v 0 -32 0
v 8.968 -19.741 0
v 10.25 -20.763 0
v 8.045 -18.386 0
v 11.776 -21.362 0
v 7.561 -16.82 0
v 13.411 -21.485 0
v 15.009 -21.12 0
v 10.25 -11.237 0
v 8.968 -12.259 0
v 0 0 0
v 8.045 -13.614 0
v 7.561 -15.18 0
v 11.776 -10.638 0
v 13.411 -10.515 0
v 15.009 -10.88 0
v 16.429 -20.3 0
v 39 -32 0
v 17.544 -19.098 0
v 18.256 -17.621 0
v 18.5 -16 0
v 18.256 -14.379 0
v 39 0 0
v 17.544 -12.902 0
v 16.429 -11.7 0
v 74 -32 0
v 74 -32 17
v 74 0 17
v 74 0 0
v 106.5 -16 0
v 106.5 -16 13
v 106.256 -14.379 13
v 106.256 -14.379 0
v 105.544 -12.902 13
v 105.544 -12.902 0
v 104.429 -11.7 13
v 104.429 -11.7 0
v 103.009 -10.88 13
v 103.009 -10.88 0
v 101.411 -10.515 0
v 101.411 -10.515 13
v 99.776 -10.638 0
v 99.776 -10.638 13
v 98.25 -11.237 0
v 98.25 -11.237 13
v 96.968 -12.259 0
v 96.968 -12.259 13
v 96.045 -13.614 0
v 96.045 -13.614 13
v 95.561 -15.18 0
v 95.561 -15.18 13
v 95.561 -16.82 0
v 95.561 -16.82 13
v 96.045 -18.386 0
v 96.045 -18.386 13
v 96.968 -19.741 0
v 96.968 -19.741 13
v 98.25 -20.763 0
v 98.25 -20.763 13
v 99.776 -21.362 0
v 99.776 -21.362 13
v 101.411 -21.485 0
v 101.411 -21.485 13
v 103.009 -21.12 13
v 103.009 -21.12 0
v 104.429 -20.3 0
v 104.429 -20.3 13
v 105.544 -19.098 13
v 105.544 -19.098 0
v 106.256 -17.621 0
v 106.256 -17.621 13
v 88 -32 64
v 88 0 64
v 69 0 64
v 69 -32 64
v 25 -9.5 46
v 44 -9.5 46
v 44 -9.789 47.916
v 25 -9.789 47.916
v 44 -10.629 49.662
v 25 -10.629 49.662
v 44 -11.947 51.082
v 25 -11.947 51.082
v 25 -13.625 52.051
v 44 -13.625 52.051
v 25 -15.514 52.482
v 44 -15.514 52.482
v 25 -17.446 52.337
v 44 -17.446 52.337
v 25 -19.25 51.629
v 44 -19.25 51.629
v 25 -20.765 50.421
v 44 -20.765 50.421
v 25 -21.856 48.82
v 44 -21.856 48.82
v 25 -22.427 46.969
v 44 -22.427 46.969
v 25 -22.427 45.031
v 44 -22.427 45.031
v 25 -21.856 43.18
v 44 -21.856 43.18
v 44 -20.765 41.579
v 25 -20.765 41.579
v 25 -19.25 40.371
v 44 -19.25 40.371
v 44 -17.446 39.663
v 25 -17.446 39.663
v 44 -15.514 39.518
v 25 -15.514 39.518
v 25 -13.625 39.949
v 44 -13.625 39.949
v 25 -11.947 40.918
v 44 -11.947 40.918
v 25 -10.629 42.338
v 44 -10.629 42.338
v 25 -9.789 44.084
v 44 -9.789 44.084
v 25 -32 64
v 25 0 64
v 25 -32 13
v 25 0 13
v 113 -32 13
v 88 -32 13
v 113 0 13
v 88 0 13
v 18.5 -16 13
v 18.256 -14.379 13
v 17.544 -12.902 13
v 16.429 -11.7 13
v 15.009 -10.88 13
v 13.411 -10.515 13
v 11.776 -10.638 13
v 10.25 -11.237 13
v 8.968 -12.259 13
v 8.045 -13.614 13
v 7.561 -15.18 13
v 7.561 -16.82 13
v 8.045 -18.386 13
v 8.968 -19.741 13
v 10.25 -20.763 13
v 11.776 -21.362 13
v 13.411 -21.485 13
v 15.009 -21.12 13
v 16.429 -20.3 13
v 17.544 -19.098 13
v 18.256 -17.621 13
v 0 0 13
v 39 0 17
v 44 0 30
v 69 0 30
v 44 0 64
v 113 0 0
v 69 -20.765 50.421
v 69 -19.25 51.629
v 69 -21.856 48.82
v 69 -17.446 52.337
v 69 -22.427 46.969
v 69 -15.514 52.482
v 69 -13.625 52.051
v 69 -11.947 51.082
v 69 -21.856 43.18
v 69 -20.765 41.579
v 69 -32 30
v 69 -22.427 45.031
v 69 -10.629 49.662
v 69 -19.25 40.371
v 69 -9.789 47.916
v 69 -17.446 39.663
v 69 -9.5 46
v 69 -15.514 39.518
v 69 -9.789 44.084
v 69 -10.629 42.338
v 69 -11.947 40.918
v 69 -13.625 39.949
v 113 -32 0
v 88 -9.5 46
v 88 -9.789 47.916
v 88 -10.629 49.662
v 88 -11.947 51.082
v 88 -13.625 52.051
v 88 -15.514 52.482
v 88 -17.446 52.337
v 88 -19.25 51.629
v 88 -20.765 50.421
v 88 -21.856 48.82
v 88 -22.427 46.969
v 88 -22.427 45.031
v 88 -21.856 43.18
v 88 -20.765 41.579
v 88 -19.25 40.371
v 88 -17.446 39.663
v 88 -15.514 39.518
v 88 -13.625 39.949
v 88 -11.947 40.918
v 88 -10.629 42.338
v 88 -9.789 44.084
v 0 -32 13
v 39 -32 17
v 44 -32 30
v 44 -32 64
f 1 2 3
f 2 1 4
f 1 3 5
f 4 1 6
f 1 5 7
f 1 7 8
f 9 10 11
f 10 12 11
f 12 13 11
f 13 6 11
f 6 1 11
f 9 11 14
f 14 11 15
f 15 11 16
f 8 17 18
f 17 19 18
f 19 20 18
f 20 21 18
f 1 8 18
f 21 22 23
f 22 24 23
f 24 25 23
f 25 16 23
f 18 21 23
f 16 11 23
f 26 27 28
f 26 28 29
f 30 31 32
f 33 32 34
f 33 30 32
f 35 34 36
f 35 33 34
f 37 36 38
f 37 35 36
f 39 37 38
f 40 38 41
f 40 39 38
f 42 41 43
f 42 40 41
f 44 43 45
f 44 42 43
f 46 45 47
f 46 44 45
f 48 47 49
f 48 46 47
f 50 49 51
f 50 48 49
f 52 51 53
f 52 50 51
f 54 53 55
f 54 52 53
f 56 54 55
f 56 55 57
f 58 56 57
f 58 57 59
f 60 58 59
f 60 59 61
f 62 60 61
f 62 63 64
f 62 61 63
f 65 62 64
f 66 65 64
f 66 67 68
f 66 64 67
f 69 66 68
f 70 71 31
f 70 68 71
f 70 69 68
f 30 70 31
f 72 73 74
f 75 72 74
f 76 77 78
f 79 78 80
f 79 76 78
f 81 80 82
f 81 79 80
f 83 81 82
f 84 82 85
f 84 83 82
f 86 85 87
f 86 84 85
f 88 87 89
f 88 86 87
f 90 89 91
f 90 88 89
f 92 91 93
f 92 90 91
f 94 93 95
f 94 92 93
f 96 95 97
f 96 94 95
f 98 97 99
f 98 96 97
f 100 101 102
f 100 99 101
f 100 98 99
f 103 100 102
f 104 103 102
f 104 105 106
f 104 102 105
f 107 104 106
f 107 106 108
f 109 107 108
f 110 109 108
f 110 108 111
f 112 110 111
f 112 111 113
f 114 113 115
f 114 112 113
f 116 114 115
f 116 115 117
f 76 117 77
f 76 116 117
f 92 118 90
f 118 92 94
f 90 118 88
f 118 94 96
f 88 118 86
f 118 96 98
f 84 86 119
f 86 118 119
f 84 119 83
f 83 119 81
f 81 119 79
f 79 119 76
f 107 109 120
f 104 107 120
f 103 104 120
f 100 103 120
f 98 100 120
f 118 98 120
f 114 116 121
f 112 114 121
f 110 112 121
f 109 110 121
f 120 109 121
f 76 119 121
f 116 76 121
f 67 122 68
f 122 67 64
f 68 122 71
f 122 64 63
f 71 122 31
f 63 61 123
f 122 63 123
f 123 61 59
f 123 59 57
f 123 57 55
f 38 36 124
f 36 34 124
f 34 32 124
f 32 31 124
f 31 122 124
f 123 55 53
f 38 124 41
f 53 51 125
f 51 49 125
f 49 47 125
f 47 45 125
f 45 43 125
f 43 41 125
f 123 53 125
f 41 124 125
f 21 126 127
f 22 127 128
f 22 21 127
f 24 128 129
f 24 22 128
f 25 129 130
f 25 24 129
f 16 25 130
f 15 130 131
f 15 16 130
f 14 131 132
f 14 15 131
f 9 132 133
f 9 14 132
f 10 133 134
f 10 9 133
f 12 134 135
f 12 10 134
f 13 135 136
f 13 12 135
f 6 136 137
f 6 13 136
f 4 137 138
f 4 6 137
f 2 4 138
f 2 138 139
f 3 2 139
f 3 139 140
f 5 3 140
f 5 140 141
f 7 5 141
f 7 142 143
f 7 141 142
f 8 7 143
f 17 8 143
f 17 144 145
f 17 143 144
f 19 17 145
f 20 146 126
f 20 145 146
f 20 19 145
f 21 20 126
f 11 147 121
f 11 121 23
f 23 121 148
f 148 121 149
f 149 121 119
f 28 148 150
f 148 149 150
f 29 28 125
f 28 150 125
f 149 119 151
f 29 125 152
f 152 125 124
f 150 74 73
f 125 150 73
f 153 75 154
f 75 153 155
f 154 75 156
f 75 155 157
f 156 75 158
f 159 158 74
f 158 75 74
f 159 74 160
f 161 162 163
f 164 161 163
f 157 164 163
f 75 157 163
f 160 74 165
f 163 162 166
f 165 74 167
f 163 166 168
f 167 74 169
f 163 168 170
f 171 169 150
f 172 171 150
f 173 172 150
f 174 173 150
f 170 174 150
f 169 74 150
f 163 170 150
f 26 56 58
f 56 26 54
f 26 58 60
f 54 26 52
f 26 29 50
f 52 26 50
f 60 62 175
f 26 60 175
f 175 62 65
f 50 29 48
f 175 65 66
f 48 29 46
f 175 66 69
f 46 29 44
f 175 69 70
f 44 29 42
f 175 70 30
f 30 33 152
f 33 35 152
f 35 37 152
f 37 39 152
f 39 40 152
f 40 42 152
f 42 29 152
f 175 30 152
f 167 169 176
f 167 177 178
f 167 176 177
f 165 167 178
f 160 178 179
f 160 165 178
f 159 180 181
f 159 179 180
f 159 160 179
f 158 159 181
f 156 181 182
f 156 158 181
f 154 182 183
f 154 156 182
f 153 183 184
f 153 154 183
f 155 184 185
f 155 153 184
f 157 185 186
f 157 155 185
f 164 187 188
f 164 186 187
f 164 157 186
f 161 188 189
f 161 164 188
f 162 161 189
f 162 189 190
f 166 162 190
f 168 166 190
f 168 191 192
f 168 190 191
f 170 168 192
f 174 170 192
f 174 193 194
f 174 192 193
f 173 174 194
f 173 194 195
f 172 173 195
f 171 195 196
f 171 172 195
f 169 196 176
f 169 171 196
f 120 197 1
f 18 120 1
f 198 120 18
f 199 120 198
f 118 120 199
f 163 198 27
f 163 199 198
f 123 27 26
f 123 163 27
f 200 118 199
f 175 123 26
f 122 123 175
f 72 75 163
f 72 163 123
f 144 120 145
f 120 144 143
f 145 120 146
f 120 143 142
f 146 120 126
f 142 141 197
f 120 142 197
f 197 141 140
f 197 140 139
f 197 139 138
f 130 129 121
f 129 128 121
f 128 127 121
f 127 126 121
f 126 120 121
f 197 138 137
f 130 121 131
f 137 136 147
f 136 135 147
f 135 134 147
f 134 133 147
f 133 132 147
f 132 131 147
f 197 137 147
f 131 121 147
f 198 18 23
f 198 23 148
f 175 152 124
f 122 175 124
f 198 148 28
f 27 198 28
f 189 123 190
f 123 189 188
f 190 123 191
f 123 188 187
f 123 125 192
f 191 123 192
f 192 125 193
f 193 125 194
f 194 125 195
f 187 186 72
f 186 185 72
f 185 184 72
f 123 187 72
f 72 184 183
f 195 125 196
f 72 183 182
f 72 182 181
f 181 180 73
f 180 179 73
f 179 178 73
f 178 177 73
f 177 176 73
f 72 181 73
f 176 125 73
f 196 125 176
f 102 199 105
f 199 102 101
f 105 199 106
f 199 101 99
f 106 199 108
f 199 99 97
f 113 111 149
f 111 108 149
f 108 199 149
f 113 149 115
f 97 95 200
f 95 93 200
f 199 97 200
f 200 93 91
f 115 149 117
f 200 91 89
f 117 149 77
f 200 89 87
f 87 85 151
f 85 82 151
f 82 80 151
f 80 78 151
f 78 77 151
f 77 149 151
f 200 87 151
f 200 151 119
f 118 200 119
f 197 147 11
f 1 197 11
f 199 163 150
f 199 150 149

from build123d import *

# Parameters (mm, degrees)
F1_DEPTH = 32
F2_R     = 6.5
F3_DEPTH = 113.001
F4_R     = 5.5
F5_DEPTH = 25
F6_R     = 5.5
F7_DEPTH = 25


with BuildPart() as f1:
    # F0 (on Front) → F1 (new body)
    with BuildSketch(Plane.XZ):
        Polygon((0, 13), (0, 0), (39, 0), (39, 17), (74, 17), (74, 0), (113, 0), (113, 13), (88, 13), (88, 64), (69, 64), (69, 30), (44, 30), (44, 64), (25, 64), (25, 13), align=None)
    extrude(amount=F1_DEPTH)

    # F2 (on Right) → F3 (cut, through all)
    with BuildSketch(Plane.YZ):
        with Locations((-16, 46)):
            Circle(F2_R)
    extrude(amount=F3_DEPTH, mode=Mode.SUBTRACT)

    # F4 (on Top) → F5 (cut)
    with BuildSketch(Plane.XY):
        with Locations((13, -16)):
            Circle(F4_R)
    extrude(amount=F5_DEPTH, mode=Mode.SUBTRACT)

    # F6 (on Top) → F7 (cut)
    with BuildSketch(Plane.XY):
        with Locations((101, -16)):
            Circle(F6_R)
    extrude(amount=F7_DEPTH, mode=Mode.SUBTRACT)


solid = f1.part
